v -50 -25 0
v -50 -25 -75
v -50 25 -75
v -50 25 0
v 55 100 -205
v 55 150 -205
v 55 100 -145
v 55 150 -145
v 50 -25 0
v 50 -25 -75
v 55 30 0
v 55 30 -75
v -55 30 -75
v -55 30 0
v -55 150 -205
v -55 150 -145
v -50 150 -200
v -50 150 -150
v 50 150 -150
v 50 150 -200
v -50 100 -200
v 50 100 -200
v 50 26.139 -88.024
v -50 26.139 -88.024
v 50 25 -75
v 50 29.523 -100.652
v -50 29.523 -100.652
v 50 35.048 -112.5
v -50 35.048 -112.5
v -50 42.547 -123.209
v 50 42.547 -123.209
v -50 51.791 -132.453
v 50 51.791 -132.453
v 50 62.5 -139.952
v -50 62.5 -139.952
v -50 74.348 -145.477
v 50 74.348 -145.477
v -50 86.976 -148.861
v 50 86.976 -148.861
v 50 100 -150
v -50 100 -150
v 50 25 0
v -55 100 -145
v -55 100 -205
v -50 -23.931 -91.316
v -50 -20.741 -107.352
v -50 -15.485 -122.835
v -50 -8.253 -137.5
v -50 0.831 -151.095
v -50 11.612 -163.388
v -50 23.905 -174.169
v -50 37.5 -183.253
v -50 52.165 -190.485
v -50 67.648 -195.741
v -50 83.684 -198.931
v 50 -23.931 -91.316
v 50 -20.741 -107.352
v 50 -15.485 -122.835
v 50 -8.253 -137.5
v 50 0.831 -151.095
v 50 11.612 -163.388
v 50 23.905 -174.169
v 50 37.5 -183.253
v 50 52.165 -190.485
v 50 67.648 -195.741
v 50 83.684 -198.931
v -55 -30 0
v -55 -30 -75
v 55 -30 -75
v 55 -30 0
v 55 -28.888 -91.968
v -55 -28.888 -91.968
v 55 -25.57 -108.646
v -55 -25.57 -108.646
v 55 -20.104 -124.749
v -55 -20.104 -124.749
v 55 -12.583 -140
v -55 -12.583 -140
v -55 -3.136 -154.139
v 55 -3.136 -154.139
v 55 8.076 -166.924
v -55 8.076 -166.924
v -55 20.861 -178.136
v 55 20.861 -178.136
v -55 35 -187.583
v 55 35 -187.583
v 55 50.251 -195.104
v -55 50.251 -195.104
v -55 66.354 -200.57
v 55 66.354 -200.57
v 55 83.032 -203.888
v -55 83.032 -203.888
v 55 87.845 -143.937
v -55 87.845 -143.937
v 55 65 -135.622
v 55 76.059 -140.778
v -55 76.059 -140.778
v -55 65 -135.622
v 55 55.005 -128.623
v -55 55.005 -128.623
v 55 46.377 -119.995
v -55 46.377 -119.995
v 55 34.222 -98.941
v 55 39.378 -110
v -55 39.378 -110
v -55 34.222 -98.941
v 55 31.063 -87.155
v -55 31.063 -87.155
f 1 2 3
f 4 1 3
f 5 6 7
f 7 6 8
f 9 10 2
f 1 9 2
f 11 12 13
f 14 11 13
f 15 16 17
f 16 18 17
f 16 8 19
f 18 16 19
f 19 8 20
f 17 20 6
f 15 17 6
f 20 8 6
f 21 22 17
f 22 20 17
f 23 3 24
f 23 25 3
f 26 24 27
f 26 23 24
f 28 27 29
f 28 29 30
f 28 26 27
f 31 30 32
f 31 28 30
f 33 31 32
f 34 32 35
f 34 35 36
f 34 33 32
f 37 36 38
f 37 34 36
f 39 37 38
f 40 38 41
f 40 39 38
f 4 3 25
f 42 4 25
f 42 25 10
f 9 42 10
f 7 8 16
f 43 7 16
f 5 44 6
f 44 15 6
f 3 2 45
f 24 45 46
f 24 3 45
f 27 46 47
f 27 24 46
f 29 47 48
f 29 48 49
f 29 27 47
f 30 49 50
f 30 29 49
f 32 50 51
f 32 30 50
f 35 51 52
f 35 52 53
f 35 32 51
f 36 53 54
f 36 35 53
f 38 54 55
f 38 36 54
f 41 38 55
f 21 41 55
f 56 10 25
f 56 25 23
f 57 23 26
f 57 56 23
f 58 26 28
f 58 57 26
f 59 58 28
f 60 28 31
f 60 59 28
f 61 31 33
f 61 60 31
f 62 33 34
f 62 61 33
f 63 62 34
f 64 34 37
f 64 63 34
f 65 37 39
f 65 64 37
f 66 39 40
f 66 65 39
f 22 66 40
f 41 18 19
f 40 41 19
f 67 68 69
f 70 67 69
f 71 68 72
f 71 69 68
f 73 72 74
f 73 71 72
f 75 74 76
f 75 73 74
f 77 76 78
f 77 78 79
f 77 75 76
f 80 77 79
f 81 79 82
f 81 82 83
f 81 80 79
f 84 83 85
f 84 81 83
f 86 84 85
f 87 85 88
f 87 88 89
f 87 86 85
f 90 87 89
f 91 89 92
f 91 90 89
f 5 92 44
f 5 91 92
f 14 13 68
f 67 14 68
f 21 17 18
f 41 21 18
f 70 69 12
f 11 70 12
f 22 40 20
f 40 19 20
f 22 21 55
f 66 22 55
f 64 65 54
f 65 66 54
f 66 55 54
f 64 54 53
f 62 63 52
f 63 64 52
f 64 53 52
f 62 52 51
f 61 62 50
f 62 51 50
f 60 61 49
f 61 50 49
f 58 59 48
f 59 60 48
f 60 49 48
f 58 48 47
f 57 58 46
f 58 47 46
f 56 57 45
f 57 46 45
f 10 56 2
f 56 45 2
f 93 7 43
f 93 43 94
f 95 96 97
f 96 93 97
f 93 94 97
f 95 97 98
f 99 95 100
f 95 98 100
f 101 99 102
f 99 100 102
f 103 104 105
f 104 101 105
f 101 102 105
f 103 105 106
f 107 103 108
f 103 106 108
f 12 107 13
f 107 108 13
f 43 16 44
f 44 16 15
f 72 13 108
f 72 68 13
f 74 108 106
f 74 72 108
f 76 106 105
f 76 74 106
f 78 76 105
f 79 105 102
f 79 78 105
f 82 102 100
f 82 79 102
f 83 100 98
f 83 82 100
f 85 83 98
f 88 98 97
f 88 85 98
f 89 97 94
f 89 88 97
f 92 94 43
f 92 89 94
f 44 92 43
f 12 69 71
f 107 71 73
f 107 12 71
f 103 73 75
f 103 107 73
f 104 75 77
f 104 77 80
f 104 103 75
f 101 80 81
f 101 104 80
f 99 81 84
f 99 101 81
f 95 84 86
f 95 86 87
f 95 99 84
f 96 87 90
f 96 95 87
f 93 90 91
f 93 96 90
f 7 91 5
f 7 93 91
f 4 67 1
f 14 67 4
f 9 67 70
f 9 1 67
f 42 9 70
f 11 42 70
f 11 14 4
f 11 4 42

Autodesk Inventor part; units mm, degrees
ref_plane "YZ Plane" through (0, 0, 0) normal (1, 0, 0) x (0, 1, 0)
ref_plane "XZ Plane" through (0, 0, 0) normal (0, 1, 0) x (-1, 0, 0)
ref_plane "XY Plane" through (0, 0, 0) normal (0, 0, 1) x (1, 0, 0)
sketch "Sketch1" plane through (0, 0, 0) normal (0, 0, 1) x (1, 0, 0)
  point P0 (0, 0)
sketch "Sketch2" plane through (0, 0, 0) normal (0, 0, 1) x (1, 0, 0)
  line L0 (-50, -25) -> (50, -25)
  line L1 (50, -25) -> (50, 25)
  line L2 (50, 25) -> (-50, 25)
  line L3 (-50, 25) -> (-50, -25)
  line L4 (-50, -25) -> (50, 25) construction
  line L5 (50, -25) -> (-50, 25) construction
  line L6 (-55, -30) -> (55, -30)
  line L7 (55, -30) -> (55, 30)
  line L8 (55, 30) -> (-55, 30)
  line L9 (-55, 30) -> (-55, -30)
  line L10 (-55, -30) -> (55, 30) construction
  line L11 (55, -30) -> (-55, 30) construction
  point P0 (0, 0)
  dimension "d0" = 100
  dimension "d1" = 50
  dimension "d2" = 110
  dimension "d3" = 60
sketch "Sketch3" plane through (0, 0, 0) normal (1, 0, 0) x (0, 1, 0)
  line L0 (0, 0) -> (0, -75)
  arc A0 (0, -75) -> (100, -175) centre (100, -75) ccw
  line L1 (100, -75) -> (100, -175) construction
  line L2 (100, -75) -> (0, -75) construction
  line L3 (100, -175) -> (150, -175)
sweep "Sweep1" add profiles "Sketch2" path "Sketch3"
properties part number "RecTubeNew"
